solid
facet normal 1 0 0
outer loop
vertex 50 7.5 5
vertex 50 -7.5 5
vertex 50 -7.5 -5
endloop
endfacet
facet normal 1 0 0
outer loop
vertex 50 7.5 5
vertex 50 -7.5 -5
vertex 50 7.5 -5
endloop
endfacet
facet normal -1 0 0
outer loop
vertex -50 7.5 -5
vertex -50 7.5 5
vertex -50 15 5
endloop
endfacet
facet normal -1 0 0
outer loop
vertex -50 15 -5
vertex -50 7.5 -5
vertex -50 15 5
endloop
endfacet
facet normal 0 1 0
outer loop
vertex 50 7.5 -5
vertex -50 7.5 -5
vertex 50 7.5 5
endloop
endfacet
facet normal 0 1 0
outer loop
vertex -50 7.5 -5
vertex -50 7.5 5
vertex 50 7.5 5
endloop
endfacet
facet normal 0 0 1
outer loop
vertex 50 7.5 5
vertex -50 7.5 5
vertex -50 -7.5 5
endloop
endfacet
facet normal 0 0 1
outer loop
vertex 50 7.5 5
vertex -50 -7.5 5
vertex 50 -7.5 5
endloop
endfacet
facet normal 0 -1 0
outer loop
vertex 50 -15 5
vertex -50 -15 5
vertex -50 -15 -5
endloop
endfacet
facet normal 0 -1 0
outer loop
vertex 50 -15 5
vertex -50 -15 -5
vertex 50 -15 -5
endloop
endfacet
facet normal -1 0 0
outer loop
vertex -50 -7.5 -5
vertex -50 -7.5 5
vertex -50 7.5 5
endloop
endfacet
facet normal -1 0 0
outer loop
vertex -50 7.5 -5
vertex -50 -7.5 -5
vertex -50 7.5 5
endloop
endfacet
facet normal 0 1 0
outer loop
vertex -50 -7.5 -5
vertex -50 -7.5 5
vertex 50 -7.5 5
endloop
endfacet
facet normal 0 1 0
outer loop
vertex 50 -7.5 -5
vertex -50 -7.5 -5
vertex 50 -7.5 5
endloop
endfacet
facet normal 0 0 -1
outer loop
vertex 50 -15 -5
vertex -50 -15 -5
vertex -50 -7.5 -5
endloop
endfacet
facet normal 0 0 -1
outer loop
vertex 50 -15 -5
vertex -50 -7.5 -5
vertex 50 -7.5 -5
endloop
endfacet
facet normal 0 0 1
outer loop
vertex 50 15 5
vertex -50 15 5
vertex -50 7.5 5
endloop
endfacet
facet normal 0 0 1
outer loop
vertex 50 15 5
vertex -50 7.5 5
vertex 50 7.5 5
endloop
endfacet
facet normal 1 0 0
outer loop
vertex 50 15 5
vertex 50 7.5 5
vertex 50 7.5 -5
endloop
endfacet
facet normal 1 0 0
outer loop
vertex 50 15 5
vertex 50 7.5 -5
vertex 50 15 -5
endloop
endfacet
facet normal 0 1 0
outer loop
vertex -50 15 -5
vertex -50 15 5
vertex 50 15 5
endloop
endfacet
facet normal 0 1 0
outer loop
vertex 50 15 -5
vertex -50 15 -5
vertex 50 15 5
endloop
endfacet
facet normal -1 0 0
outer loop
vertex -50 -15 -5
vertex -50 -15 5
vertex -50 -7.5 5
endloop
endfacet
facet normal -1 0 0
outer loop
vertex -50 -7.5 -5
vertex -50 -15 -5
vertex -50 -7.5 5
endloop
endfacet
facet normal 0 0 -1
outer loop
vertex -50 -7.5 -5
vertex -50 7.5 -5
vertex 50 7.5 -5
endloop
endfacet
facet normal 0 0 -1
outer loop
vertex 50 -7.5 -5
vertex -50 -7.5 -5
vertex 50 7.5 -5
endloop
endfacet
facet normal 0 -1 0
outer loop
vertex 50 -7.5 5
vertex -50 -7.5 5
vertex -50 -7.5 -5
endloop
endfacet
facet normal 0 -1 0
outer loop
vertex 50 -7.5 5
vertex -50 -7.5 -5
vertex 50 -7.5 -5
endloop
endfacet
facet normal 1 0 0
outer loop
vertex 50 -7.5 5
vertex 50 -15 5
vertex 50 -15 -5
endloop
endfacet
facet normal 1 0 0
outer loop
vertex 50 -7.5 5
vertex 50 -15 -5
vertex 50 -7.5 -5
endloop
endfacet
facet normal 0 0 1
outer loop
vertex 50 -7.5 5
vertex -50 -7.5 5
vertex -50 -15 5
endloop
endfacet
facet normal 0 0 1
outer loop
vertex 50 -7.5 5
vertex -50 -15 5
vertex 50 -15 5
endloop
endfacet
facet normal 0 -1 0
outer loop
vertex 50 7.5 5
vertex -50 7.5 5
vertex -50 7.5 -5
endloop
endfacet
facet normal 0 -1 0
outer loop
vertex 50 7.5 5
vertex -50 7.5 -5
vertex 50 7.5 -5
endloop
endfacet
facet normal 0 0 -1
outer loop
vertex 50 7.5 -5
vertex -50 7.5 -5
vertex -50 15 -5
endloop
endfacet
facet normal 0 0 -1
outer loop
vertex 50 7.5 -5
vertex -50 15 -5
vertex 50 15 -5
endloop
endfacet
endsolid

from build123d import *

# Parameters (mm, degrees)
SKIZZE1_W                                   = 100
SKIZZE1_H                                   = 15
AUFSATZ_LINEAR_AUSTRAGEN1_DEPTH             = 5
AUFSATZ_LINEAR_AUSTRAGEN2_REACH             = 7
SKIZZE2_W                                   = 100
SKIZZE2_H                                   = 7.5
AUFSATZ_LINEAR_AUSTRAGEN2_DIRECTION_2_REACH = 7


with BuildPart() as part:
    # Skizze1 → Aufsatz-Linear austragen1 (new body, symmetric)
    with BuildSketch(Plane.XY):
        Rectangle(SKIZZE1_W, SKIZZE1_H)
    extrude(amount=AUFSATZ_LINEAR_AUSTRAGEN1_DEPTH, both=True)


with BuildPart() as body_2:

    # Aufsatz-Linear austragen2: up to this face of the body (flat: up to its plane)
    aufsatz_linear_austragen2_end = Plane(part.part.faces().sort_by_distance((0, 0, 5))[0])
    # Skizze2 → Aufsatz-Linear austragen2 (new body, up to the picked face)
    with BuildSketch(Plane.XY, mode=Mode.PRIVATE) as aufsatz_linear_austragen2_sk1:
        with Locations((0, 11.25)):
            Rectangle(SKIZZE2_W, SKIZZE2_H)
    aufsatz_linear_austragen2_tool1 = split(extrude(aufsatz_linear_austragen2_sk1.sketch, amount=AUFSATZ_LINEAR_AUSTRAGEN2_REACH, mode=Mode.PRIVATE), bisect_by=aufsatz_linear_austragen2_end, keep=Keep.BOTH, mode=Mode.PRIVATE)
    add(aufsatz_linear_austragen2_tool1.solids().sort_by(Axis((0, 11.25, 0), (0, 0, 1)))[0])
    # Skizze2 → Aufsatz-Linear austragen2 (new body, up to the picked face)
    with BuildSketch(Plane.XY, mode=Mode.PRIVATE) as aufsatz_linear_austragen2_sk2:
        with Locations((0, -11.25)):
            Rectangle(SKIZZE2_W, SKIZZE2_H)
    aufsatz_linear_austragen2_tool2 = split(extrude(aufsatz_linear_austragen2_sk2.sketch, amount=AUFSATZ_LINEAR_AUSTRAGEN2_REACH, mode=Mode.PRIVATE), bisect_by=aufsatz_linear_austragen2_end, keep=Keep.BOTH, mode=Mode.PRIVATE)
    add(aufsatz_linear_austragen2_tool2.solids().sort_by(Axis((0, -11.25, 0), (0, 0, 1)))[0])


    # Aufsatz-Linear austragen2 direction 2: up to this face of the body (flat: up to its plane)
    aufsatz_linear_austragen2_direction_2_end = Plane(part.part.faces().sort_by_distance((0, 0, -5))[0])
    # Skizze2 → Aufsatz-Linear austragen2 direction 2 (add, up to the picked face)
    with BuildSketch(Plane.XY, mode=Mode.PRIVATE) as aufsatz_linear_austragen2_direction_2_sk1:
        with Locations((0, 11.25)):
            Rectangle(SKIZZE2_W, SKIZZE2_H)
    aufsatz_linear_austragen2_direction_2_tool1 = split(extrude(aufsatz_linear_austragen2_direction_2_sk1.sketch, amount=-AUFSATZ_LINEAR_AUSTRAGEN2_DIRECTION_2_REACH, mode=Mode.PRIVATE), bisect_by=aufsatz_linear_austragen2_direction_2_end, keep=Keep.BOTH, mode=Mode.PRIVATE)
    add(aufsatz_linear_austragen2_direction_2_tool1.solids().sort_by(Axis((0, 11.25, 0), (0, 0, -1)))[0])
    # Skizze2 → Aufsatz-Linear austragen2 direction 2 (add, up to the picked face)
    with BuildSketch(Plane.XY, mode=Mode.PRIVATE) as aufsatz_linear_austragen2_direction_2_sk2:
        with Locations((0, -11.25)):
            Rectangle(SKIZZE2_W, SKIZZE2_H)
    aufsatz_linear_austragen2_direction_2_tool2 = split(extrude(aufsatz_linear_austragen2_direction_2_sk2.sketch, amount=-AUFSATZ_LINEAR_AUSTRAGEN2_DIRECTION_2_REACH, mode=Mode.PRIVATE), bisect_by=aufsatz_linear_austragen2_direction_2_end, keep=Keep.BOTH, mode=Mode.PRIVATE)
    add(aufsatz_linear_austragen2_direction_2_tool2.solids().sort_by(Axis((0, -11.25, 0), (0, 0, -1)))[0])


solid = Compound([part.part, body_2.part])
